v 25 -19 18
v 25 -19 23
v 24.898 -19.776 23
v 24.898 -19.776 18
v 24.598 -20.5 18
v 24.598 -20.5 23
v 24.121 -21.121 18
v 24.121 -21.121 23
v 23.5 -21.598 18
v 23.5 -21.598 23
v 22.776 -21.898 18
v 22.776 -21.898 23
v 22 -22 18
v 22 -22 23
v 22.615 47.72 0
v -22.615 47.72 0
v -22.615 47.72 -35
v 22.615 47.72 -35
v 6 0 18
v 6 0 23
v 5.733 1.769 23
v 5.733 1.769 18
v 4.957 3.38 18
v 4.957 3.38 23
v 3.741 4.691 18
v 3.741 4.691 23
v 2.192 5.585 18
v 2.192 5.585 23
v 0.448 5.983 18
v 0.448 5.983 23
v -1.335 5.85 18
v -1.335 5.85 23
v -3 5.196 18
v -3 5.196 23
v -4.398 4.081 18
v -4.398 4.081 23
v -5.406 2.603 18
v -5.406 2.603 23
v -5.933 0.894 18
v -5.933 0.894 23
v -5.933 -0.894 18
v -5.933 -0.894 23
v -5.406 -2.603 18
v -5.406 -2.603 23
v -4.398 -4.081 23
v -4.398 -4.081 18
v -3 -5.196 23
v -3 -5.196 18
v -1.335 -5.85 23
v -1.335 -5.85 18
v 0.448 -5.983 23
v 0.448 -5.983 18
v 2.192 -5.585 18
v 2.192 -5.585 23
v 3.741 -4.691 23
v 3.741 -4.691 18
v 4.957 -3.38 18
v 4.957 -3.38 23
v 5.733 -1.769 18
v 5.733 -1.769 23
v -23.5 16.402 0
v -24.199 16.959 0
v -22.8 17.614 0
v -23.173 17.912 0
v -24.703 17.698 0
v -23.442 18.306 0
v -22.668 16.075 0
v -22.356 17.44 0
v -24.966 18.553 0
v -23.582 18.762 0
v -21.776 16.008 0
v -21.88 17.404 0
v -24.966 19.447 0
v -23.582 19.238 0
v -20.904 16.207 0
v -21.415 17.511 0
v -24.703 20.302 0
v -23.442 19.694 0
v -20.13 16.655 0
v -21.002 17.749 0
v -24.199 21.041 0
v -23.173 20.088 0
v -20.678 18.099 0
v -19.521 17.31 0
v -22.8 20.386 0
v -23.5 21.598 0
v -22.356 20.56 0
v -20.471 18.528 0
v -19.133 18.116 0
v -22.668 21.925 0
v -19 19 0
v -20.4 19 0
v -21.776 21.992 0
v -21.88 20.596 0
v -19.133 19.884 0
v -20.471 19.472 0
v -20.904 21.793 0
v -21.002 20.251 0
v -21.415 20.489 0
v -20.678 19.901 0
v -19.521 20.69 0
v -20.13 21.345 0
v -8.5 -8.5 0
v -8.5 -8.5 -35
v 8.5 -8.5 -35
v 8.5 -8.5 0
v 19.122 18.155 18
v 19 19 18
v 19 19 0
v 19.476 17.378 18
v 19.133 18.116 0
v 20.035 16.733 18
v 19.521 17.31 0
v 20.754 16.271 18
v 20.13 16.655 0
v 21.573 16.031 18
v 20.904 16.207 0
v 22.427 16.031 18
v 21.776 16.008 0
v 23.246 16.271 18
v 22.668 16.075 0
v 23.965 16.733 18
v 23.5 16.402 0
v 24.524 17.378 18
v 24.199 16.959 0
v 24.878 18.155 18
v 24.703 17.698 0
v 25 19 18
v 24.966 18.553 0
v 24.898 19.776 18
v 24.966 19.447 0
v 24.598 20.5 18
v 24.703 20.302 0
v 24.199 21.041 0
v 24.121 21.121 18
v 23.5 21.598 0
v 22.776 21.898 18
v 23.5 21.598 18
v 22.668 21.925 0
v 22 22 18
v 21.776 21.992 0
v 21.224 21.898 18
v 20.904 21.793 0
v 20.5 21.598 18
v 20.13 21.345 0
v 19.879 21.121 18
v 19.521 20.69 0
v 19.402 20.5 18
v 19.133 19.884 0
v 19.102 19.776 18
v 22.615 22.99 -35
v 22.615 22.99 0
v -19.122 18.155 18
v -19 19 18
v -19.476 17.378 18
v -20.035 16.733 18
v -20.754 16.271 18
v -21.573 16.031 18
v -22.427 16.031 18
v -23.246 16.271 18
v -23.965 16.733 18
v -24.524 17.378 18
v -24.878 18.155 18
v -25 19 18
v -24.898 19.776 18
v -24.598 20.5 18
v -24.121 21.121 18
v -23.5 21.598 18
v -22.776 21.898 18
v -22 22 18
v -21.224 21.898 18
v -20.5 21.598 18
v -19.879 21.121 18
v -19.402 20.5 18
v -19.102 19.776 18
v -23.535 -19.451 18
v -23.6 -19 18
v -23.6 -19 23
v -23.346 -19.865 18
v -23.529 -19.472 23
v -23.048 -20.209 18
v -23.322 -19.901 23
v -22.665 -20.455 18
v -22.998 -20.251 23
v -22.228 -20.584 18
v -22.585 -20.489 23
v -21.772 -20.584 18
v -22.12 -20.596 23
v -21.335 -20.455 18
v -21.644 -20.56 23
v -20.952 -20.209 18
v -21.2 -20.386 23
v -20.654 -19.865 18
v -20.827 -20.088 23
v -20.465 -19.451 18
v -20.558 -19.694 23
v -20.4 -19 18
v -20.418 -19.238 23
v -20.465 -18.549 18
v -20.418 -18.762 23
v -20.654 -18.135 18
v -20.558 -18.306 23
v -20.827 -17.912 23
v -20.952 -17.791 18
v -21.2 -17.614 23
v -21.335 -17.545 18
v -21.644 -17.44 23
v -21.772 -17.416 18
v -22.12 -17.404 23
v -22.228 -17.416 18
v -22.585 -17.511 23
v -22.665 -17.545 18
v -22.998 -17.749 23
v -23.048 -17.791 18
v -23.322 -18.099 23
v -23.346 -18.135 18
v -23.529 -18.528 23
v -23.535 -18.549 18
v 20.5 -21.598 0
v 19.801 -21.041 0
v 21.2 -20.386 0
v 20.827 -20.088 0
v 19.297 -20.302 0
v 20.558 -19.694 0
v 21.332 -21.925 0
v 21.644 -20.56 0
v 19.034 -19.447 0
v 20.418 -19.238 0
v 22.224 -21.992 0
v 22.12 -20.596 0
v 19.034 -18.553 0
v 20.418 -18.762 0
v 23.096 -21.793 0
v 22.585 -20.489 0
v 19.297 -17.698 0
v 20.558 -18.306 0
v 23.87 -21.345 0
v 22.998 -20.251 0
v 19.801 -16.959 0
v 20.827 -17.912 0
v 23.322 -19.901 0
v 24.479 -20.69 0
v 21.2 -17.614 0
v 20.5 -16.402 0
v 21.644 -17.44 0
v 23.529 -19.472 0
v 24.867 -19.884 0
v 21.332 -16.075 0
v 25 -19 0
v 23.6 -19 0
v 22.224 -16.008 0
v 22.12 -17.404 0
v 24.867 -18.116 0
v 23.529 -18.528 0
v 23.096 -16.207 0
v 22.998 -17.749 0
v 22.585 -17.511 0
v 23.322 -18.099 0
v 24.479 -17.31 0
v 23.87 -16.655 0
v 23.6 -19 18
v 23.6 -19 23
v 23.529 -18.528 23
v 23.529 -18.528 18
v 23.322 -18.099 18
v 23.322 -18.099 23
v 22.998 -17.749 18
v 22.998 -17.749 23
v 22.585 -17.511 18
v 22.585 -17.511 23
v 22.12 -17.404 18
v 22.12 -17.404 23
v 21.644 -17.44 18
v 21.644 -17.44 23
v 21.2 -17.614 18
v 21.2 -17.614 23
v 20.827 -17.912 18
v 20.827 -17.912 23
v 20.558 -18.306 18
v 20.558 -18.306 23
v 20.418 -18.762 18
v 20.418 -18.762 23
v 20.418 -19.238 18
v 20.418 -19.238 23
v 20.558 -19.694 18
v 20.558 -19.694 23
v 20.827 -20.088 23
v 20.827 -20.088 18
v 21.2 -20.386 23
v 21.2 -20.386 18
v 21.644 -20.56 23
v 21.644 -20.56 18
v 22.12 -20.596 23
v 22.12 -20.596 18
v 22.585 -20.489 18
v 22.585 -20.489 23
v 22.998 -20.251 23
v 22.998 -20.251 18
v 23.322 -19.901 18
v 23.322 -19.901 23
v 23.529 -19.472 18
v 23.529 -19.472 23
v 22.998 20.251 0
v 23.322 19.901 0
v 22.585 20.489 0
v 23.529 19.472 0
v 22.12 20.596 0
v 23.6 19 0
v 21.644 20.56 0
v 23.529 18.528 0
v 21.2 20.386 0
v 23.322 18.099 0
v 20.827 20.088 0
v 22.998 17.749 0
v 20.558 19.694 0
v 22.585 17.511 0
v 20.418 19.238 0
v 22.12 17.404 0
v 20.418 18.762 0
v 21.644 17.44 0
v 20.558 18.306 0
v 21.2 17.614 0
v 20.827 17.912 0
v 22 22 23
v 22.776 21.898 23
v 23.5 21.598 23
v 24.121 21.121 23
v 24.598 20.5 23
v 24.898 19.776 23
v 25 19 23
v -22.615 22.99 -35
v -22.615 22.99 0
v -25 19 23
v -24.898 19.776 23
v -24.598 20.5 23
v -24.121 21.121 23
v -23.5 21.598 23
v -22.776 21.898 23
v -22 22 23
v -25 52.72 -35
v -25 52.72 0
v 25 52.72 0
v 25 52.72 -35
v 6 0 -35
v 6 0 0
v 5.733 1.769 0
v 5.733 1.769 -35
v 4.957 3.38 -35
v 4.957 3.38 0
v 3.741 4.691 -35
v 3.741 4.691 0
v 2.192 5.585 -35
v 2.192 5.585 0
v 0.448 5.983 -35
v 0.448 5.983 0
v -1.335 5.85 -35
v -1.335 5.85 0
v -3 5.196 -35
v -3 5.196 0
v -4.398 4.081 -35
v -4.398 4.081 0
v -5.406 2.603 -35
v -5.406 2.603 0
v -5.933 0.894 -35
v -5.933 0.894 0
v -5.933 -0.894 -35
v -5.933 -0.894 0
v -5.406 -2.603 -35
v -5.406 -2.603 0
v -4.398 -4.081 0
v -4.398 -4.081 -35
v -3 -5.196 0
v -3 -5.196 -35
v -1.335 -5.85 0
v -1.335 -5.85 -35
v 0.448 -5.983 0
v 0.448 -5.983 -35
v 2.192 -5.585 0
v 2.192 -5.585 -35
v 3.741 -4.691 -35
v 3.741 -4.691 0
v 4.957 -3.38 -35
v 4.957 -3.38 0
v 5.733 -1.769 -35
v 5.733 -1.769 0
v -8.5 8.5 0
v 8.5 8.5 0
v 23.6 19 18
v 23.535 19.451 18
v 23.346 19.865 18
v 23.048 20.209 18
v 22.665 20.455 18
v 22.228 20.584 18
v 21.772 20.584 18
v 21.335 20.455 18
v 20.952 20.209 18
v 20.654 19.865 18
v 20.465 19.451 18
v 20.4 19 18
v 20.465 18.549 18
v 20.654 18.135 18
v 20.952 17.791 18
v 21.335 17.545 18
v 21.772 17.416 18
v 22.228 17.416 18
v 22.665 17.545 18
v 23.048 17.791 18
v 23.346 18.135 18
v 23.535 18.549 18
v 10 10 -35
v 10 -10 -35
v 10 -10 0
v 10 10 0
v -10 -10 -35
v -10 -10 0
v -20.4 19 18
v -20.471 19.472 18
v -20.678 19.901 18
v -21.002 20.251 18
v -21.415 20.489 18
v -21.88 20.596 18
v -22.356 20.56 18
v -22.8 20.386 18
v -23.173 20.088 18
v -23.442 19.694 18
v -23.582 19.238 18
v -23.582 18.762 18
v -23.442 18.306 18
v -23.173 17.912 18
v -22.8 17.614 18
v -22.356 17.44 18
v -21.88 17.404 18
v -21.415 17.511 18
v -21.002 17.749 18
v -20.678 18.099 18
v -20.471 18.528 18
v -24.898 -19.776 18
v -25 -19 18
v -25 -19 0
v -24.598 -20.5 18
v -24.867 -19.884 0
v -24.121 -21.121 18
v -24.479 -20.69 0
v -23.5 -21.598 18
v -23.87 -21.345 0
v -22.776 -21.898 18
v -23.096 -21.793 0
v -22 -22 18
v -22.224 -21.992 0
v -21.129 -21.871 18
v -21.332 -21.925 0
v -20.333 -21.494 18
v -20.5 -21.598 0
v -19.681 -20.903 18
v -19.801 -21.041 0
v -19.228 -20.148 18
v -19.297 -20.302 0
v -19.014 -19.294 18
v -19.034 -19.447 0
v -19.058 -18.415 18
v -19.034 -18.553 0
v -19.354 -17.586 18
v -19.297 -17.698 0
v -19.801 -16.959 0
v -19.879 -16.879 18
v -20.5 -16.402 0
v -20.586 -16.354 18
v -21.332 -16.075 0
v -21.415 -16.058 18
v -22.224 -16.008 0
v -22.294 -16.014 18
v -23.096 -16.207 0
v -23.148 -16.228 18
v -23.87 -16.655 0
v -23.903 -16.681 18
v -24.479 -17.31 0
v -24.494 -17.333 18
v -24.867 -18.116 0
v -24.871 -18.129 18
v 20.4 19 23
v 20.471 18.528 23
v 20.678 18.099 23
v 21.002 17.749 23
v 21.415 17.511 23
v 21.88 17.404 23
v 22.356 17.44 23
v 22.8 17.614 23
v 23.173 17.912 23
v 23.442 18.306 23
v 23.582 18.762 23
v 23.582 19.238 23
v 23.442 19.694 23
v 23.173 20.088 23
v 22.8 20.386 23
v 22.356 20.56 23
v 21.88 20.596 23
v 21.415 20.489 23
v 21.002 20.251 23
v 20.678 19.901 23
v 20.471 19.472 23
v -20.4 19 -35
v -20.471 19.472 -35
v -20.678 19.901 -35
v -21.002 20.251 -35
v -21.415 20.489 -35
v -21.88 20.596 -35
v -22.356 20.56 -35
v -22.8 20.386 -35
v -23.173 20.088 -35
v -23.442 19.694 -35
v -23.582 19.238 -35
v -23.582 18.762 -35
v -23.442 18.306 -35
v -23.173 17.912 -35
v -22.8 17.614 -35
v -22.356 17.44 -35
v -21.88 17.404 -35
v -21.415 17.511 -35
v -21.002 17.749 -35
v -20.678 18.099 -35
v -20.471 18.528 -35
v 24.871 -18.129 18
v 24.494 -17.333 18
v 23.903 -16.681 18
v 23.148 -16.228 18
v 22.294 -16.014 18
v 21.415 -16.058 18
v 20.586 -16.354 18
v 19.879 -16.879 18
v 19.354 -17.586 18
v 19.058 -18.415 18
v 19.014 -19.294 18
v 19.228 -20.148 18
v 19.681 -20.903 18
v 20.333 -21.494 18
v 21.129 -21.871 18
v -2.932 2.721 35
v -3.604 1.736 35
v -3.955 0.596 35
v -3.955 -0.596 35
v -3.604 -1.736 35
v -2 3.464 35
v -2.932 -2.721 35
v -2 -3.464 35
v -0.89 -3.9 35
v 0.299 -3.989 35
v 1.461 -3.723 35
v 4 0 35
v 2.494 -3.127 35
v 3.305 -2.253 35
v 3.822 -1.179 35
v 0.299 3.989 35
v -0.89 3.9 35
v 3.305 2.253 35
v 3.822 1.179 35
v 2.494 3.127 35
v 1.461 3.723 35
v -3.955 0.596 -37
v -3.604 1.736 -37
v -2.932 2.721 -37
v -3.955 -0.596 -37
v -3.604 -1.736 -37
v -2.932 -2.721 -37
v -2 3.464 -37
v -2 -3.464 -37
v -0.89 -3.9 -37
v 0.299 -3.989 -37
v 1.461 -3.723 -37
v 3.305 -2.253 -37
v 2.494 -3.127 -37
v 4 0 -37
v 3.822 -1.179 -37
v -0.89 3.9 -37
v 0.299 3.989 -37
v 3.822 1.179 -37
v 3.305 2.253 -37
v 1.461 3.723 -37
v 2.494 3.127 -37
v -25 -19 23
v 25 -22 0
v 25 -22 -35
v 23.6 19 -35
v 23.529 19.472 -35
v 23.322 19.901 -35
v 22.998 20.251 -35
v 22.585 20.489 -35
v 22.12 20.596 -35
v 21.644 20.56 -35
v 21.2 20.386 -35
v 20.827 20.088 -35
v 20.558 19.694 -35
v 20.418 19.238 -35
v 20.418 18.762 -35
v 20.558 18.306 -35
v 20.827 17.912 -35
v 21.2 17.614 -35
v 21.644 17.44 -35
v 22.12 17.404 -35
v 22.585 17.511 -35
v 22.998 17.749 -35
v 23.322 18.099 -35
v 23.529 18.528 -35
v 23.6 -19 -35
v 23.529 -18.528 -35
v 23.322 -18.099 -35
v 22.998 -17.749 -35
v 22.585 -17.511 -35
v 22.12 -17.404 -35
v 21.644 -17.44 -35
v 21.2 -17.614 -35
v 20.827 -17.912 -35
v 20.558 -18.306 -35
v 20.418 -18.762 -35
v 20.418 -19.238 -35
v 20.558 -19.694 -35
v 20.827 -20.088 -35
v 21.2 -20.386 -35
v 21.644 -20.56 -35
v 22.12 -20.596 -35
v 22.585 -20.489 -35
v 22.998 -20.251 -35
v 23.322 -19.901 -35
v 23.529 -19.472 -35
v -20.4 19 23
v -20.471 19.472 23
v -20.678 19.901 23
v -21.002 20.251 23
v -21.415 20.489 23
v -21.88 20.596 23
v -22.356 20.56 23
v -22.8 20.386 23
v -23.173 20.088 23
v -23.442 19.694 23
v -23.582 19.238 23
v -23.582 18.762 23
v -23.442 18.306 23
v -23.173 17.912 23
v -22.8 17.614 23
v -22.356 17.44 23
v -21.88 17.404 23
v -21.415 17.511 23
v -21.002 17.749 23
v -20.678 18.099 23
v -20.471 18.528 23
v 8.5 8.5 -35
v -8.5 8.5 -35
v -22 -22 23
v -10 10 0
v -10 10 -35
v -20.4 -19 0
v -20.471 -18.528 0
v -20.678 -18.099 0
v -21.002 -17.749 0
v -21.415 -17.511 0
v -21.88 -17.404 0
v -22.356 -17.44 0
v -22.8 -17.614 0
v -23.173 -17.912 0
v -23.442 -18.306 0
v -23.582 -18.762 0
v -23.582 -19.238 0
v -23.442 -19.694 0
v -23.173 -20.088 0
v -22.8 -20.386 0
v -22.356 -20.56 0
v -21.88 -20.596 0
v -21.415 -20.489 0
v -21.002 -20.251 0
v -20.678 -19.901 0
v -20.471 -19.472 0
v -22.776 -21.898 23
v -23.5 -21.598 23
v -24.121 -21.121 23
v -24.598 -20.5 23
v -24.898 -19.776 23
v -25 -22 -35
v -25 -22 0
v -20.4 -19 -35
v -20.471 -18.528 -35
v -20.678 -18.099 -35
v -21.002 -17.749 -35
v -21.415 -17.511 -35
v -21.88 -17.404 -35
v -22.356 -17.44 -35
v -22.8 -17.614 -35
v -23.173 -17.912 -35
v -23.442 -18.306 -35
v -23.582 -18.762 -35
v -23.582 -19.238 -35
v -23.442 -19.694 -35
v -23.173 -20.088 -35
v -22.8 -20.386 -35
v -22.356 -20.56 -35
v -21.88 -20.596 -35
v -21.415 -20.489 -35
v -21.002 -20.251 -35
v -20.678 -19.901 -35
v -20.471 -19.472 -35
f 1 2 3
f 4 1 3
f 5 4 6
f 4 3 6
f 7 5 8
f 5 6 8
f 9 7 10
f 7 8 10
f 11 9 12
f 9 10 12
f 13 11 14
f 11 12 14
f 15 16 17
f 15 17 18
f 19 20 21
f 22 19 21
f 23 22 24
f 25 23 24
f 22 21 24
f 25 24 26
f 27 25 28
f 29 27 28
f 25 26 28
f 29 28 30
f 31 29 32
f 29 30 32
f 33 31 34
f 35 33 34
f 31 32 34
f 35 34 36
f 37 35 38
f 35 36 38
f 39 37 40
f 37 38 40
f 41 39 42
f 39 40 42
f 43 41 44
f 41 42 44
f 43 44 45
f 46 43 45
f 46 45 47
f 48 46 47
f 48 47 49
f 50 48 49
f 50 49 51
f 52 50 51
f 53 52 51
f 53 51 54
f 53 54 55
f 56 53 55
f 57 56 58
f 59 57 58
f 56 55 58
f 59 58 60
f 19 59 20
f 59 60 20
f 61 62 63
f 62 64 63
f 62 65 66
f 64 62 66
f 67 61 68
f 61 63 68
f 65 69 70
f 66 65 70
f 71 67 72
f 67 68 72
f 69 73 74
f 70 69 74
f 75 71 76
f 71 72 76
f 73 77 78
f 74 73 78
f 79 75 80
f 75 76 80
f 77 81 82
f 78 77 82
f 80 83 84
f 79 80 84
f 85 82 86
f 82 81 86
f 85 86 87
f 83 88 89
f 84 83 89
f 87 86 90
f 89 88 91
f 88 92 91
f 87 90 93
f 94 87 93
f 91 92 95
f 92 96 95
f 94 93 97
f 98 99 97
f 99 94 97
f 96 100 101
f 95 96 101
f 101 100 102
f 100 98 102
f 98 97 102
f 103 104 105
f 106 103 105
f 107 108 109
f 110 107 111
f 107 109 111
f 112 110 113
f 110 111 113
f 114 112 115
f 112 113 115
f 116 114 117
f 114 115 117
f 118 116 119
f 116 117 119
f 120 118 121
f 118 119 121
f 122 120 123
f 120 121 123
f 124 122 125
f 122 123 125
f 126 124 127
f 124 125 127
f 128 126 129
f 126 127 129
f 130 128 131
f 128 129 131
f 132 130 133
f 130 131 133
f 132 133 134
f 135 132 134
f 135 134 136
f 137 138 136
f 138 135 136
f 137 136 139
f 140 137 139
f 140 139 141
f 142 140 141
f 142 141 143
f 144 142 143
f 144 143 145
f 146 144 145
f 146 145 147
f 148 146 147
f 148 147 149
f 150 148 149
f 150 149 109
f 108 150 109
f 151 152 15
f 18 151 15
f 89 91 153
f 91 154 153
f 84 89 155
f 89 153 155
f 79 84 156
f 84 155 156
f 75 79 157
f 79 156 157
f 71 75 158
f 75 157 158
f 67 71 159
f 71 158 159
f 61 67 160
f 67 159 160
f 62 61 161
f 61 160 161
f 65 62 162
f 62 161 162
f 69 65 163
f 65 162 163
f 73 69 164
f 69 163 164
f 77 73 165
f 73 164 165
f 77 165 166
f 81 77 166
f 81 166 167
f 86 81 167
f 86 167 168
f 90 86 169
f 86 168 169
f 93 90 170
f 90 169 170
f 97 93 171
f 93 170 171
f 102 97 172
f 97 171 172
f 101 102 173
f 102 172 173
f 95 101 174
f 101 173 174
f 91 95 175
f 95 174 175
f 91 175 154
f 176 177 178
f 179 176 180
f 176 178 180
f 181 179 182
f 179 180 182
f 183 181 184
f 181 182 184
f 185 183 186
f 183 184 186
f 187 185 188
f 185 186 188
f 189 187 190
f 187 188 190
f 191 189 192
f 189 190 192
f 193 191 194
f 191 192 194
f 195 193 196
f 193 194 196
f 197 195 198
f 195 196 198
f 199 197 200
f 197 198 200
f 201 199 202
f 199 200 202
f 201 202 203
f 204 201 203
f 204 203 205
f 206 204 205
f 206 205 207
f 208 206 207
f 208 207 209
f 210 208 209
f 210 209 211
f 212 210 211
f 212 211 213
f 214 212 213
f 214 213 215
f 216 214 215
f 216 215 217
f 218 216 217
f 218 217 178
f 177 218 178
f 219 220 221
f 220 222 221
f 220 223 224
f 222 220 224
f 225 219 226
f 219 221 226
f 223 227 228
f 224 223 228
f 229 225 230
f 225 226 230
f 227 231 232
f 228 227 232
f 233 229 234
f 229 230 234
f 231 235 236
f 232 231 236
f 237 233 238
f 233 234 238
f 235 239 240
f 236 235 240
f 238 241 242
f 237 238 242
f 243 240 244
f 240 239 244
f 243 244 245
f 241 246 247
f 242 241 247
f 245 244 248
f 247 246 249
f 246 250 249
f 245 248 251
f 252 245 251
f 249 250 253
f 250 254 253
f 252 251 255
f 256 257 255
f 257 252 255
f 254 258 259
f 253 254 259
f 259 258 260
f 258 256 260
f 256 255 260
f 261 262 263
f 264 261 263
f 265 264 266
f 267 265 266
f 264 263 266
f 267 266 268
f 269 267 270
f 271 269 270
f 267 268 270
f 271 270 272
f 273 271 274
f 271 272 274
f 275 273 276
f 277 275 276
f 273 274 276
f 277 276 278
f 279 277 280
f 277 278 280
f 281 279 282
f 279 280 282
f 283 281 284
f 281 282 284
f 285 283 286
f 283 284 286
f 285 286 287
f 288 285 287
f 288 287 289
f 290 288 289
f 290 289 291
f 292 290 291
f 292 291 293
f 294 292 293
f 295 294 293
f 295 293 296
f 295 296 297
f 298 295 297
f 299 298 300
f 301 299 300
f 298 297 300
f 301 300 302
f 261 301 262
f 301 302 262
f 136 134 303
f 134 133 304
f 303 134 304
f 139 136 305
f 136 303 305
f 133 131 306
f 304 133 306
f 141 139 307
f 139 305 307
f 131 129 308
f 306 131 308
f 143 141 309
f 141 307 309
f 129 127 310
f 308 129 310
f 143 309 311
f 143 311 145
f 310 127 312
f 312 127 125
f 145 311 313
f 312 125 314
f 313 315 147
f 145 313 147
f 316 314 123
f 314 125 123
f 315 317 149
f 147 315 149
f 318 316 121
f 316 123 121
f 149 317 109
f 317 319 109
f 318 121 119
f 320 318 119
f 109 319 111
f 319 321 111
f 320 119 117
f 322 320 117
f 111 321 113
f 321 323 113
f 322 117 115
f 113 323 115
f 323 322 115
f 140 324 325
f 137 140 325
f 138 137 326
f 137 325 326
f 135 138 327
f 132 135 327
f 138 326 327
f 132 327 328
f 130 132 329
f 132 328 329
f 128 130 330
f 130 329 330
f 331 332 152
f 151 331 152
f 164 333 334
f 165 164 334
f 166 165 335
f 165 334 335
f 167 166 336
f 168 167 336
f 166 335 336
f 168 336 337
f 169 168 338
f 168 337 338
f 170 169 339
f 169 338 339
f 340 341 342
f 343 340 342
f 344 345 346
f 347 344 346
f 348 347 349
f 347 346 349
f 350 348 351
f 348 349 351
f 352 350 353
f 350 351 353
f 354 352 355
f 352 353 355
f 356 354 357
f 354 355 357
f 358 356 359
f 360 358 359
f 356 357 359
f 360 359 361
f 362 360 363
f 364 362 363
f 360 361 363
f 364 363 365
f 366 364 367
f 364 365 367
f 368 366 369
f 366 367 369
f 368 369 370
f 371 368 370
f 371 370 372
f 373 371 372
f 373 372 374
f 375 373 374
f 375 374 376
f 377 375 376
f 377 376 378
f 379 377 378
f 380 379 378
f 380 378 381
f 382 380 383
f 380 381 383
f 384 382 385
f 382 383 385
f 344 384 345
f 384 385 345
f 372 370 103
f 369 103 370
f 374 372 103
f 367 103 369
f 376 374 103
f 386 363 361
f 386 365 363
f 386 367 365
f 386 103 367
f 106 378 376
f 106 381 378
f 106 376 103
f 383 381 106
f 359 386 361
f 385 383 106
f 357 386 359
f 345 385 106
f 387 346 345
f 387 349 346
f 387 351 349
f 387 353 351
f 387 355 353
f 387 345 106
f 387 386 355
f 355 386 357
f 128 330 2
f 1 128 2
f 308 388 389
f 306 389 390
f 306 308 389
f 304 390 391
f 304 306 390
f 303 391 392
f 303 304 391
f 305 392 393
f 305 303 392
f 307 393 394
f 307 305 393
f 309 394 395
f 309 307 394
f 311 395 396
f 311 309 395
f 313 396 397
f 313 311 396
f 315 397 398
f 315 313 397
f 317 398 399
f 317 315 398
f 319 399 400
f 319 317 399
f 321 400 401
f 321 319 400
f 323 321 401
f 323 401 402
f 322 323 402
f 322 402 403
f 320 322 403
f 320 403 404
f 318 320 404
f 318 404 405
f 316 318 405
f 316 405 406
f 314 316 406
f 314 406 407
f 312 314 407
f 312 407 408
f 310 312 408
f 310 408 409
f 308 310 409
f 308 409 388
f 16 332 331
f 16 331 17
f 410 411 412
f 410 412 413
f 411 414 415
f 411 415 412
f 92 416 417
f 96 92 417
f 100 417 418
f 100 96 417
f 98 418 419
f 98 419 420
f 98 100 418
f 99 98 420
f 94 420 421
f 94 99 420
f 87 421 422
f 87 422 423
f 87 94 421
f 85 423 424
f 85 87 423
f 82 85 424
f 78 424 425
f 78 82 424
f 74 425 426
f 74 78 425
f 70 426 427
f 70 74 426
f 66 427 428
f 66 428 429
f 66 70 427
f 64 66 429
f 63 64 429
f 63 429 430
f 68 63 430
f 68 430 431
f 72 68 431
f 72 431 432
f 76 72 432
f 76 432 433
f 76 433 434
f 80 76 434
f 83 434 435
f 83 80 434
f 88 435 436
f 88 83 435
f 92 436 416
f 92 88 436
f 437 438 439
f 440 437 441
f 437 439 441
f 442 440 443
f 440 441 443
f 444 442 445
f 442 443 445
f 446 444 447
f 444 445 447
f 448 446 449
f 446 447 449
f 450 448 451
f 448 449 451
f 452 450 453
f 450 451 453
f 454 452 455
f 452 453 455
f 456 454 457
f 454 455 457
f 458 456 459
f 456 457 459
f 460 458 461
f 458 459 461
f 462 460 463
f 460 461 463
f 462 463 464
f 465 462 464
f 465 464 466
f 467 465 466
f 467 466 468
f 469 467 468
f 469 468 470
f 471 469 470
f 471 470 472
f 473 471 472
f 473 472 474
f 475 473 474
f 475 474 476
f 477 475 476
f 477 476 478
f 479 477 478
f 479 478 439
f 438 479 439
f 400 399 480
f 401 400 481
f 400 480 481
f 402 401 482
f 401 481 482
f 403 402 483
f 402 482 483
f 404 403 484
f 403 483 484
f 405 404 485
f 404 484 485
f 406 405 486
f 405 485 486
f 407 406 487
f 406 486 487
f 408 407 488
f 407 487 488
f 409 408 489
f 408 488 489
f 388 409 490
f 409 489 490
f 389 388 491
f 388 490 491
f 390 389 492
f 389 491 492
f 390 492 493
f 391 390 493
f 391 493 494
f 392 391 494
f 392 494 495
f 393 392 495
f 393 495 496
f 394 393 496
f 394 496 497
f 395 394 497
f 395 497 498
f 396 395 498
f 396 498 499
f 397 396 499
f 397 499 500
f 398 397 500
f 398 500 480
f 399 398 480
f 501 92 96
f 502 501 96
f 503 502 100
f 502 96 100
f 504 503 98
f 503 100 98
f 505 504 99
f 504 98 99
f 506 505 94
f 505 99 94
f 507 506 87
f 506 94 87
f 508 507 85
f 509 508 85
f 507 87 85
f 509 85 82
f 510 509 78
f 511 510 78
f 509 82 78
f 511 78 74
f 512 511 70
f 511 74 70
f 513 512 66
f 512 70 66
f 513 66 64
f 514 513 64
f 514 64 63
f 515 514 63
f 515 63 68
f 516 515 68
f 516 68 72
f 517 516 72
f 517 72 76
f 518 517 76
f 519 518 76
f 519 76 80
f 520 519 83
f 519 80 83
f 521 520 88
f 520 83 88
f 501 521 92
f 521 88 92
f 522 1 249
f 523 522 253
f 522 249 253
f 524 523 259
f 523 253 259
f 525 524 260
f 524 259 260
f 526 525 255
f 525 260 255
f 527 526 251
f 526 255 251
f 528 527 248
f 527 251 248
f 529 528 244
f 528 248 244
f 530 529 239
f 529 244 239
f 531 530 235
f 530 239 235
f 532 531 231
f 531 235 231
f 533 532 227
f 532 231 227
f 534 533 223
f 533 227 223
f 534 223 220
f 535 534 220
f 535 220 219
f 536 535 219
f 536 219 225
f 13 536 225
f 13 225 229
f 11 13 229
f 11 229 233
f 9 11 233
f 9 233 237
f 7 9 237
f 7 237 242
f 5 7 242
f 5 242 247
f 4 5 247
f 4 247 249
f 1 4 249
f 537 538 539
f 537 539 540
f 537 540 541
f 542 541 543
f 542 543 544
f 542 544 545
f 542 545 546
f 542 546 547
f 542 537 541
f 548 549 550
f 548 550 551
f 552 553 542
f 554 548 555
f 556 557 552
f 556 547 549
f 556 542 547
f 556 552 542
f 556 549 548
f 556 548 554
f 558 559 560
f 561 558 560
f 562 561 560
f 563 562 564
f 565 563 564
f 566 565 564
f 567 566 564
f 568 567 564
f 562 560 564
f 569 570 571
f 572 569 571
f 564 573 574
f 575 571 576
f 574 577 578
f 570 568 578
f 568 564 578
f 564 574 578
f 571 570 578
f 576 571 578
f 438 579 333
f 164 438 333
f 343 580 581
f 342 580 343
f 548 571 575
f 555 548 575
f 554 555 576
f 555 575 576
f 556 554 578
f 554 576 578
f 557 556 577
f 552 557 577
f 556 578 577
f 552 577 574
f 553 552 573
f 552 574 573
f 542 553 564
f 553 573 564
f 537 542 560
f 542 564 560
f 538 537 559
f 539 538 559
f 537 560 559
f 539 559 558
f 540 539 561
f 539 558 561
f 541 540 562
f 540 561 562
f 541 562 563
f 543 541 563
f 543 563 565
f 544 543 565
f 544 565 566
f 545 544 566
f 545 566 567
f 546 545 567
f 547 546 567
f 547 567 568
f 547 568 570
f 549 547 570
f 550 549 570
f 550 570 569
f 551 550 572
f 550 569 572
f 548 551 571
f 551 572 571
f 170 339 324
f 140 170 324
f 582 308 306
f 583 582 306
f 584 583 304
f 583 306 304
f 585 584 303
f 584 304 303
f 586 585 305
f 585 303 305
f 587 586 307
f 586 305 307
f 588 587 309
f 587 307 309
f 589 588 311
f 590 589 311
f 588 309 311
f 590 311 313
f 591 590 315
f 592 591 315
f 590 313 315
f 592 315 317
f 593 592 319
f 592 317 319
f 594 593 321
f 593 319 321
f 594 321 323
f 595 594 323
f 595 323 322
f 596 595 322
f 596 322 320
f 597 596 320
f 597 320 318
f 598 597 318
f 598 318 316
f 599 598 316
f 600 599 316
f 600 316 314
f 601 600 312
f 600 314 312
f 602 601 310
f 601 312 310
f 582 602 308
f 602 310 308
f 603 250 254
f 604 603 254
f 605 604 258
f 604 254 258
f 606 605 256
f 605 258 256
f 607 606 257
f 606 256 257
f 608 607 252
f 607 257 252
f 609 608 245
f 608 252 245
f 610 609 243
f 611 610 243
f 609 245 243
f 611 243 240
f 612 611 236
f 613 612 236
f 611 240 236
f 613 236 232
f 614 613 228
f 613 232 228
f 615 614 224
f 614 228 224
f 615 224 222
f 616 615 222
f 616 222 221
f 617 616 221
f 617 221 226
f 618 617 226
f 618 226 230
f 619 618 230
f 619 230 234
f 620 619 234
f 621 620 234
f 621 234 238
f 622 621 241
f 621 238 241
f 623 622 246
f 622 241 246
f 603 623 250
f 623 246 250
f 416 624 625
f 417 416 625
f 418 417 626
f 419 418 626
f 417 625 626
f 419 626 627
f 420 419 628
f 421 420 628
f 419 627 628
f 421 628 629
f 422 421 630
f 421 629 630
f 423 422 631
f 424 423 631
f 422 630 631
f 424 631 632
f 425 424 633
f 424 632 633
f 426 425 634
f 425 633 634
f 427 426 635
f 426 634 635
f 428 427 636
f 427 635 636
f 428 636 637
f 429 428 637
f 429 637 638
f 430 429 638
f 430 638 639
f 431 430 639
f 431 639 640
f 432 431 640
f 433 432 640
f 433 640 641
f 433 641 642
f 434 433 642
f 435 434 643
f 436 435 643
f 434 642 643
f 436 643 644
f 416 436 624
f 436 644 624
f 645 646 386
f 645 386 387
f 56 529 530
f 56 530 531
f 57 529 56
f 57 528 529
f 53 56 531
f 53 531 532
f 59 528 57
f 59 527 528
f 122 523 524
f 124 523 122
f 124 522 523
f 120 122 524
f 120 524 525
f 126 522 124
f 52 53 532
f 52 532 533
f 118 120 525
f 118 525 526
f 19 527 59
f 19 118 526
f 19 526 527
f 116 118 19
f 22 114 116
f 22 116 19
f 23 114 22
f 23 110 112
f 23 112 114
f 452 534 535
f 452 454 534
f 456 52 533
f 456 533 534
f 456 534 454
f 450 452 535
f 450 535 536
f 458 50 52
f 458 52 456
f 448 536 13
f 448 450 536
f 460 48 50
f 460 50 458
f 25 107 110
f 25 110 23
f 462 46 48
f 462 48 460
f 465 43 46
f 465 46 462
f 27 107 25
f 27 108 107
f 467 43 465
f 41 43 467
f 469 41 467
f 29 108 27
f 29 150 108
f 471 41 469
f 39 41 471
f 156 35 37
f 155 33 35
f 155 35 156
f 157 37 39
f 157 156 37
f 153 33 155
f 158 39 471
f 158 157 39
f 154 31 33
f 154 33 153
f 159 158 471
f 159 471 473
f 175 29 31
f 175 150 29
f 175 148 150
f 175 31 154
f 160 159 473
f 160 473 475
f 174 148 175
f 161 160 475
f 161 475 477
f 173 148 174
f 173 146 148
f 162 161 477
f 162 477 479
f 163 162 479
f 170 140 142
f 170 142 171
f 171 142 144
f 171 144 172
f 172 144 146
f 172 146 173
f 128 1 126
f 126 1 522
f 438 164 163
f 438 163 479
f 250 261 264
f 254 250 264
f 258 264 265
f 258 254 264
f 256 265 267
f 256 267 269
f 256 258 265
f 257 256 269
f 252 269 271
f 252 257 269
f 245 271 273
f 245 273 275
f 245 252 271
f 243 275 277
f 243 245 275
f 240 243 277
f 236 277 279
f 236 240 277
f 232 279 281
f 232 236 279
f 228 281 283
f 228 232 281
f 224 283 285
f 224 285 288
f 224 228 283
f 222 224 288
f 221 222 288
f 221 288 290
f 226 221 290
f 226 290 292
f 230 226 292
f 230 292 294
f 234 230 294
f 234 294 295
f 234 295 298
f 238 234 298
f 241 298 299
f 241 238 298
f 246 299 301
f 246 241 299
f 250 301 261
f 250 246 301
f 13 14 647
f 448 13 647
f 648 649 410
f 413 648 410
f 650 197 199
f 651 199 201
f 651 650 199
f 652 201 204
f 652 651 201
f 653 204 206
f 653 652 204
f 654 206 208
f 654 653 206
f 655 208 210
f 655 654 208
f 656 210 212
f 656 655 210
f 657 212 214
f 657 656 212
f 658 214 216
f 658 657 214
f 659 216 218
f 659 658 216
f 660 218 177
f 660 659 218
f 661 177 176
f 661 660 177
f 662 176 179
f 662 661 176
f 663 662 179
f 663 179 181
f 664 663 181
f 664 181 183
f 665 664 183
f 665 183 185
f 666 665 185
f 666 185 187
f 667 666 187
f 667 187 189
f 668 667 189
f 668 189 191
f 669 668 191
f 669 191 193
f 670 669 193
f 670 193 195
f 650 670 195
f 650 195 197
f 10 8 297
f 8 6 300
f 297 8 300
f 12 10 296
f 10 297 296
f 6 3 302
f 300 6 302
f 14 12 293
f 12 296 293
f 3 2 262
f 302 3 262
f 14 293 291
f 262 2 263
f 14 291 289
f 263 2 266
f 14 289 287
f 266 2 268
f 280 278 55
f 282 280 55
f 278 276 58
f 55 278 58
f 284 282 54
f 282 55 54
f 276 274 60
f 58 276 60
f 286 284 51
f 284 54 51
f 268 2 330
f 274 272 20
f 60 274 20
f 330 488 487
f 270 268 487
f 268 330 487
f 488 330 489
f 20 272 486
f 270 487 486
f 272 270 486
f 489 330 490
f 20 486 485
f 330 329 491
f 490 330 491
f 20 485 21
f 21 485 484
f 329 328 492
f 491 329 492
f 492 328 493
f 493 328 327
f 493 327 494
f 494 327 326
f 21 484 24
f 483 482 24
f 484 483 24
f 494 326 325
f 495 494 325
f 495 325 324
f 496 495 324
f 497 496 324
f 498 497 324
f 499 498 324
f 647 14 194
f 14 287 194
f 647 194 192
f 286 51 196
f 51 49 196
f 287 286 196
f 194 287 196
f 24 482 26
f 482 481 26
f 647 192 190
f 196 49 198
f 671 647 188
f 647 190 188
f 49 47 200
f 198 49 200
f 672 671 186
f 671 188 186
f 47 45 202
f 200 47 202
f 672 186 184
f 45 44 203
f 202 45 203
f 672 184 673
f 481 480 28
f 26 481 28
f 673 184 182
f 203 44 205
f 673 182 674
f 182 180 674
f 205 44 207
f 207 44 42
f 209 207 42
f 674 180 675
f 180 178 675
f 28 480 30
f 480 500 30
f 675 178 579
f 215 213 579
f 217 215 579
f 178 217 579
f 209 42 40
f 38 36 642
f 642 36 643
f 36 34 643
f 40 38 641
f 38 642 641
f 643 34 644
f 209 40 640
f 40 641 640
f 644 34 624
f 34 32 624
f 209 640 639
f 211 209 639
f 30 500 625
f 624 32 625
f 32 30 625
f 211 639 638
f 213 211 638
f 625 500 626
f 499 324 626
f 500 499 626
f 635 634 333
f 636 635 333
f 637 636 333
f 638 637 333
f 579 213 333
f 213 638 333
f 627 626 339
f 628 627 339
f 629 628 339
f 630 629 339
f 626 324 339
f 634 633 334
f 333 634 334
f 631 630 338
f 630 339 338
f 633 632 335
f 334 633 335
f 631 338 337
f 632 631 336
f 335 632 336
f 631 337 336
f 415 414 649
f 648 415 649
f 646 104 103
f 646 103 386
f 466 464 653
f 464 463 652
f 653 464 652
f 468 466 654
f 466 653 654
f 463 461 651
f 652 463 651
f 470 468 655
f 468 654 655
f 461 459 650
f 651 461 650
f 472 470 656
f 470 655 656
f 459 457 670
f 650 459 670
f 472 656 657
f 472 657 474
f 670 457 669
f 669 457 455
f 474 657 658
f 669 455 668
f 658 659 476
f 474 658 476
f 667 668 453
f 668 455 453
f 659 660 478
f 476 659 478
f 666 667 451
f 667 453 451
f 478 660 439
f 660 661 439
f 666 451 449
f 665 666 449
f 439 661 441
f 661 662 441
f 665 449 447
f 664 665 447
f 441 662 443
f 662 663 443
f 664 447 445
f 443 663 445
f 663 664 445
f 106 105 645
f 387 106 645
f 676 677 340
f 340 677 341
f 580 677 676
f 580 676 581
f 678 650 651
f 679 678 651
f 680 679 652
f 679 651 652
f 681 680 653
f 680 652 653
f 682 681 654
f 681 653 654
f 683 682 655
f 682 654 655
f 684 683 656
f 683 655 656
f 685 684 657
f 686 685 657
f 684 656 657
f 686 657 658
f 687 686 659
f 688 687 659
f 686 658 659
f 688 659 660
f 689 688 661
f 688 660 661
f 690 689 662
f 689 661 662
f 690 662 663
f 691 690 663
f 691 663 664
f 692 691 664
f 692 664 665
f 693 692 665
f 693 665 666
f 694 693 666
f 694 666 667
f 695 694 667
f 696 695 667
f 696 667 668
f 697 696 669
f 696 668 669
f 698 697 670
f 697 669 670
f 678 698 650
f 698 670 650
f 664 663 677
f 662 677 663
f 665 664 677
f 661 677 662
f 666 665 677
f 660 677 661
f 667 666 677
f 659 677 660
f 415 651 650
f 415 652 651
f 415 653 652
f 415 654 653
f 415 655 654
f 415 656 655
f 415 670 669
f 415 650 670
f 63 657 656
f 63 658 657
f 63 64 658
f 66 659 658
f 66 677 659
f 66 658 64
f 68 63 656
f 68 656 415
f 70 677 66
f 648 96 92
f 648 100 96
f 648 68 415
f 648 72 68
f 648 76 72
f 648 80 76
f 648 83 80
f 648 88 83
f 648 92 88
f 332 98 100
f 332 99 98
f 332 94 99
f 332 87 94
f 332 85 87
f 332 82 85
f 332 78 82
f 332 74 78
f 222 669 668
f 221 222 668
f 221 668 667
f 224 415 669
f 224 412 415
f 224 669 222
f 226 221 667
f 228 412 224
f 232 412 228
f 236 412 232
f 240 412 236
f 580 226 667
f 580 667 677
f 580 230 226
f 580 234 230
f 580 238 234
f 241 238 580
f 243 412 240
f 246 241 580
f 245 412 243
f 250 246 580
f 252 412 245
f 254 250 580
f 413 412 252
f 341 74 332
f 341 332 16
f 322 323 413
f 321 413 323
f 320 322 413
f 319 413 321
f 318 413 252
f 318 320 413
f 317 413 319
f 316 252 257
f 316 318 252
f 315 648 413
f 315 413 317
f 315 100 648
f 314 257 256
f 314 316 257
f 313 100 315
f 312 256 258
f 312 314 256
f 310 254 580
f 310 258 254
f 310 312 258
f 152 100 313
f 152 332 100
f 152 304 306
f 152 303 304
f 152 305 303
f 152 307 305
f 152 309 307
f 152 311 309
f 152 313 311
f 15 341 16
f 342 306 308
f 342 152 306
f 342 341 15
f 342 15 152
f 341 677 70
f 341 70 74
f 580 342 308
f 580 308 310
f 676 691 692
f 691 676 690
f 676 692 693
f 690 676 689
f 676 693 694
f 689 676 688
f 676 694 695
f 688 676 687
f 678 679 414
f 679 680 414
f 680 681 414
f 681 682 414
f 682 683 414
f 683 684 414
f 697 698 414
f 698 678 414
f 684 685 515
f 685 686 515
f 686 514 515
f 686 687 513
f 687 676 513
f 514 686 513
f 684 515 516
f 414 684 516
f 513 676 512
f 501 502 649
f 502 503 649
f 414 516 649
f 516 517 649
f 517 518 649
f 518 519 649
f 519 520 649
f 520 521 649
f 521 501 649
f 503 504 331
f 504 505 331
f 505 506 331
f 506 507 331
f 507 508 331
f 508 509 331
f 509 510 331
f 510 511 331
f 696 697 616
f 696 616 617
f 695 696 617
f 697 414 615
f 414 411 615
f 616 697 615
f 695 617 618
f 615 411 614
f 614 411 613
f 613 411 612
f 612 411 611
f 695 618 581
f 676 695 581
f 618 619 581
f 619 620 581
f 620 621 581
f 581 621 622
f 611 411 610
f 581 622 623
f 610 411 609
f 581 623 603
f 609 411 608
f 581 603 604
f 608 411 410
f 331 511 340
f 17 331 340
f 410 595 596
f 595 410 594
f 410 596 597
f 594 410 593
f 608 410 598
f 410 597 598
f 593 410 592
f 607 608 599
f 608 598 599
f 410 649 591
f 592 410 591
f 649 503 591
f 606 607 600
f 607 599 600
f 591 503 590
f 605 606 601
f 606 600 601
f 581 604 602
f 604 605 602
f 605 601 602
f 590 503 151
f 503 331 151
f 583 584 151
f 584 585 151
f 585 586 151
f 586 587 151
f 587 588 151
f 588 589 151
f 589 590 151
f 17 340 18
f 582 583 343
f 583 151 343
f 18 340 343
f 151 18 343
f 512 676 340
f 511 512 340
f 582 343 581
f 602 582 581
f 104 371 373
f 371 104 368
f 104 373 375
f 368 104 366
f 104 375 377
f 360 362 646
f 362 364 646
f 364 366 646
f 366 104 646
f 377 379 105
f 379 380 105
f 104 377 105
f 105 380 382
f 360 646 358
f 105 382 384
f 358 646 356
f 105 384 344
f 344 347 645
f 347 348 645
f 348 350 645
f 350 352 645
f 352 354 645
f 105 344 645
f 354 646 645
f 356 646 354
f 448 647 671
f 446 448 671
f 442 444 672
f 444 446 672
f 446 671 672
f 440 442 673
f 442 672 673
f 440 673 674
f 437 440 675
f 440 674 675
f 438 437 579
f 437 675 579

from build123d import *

# Parameters (mm, degrees)
SKETCH_2_W           = 50
SKETCH_2_H           = 74.720339059
SKETCH_2_R           = 1.6
SKETCH_2_W_2         = 20
SKETCH_2_H_2         = 20
SKETCH_2_W_3         = 45.23
SKETCH_2_H_3         = 24.73
EXTRUDE_1_DEPTH      = 35
SKETCH_2_W_4         = 17
SKETCH_2_H_4         = 17
SKETCH_2_R_2         = 6
EXTRUDE_1_2_DEPTH    = 35
EXTRUDE_2_DEPTH      = 35
EXTRUDE_2_DEPTH_BACK = 37
SKETCH_3_R           = 4
SKETCH_6_R           = 3
SKETCH_6_R_2         = 1.6
EXTRUDE_3_DEPTH      = 18
EXTRUDE_3_2_DEPTH    = 18
EXTRUDE_3_3_DEPTH    = 18
EXTRUDE_3_4_DEPTH    = 18
EXTRUDE_START        = 5
SKETCH_7_R           = 1.6
SKETCH_7_R_2         = 6
EXTRUDE_4_DEPTH      = 5


with BuildPart() as part:
    # ｽｹｯﾁ2 → ﾎﾞｽ - 押し出し1 (new body)
    with BuildSketch(Plane.XY):
        with Locations((0, 15.36016953)):
            Rectangle(SKETCH_2_W, SKETCH_2_H)
        with Locations((-22, 19)):
            Circle(SKETCH_2_R, mode=Mode.SUBTRACT)
        with Locations((-22, -19)):
            Circle(SKETCH_2_R, mode=Mode.SUBTRACT)
        with Locations((22, -19)):
            Circle(SKETCH_2_R, mode=Mode.SUBTRACT)
        with Locations((22, 19)):
            Circle(SKETCH_2_R, mode=Mode.SUBTRACT)
        Rectangle(SKETCH_2_W_2, SKETCH_2_H_2, mode=Mode.SUBTRACT)
        with Locations((0, 35.355339059)):
            Rectangle(SKETCH_2_W_3, SKETCH_2_H_3, mode=Mode.SUBTRACT)
    extrude(amount=-EXTRUDE_1_DEPTH)


with BuildPart() as body_2:
    # ｽｹｯﾁ2 → Extrude 1 2 (new body)
    with BuildSketch(Plane.XY):
        Rectangle(SKETCH_2_W_4, SKETCH_2_H_4)
        Circle(SKETCH_2_R_2, mode=Mode.SUBTRACT)
    extrude(amount=-EXTRUDE_1_2_DEPTH)


with BuildPart() as body_3:
    # ｽｹｯﾁ3 → ﾎﾞｽ - 押し出し2 (new, two sides: drawn at the far end of the back side and taken through both)
    with BuildSketch(Plane.XY.offset(-EXTRUDE_2_DEPTH_BACK)):
        Circle(SKETCH_3_R)
    extrude(amount=EXTRUDE_2_DEPTH + EXTRUDE_2_DEPTH_BACK)


with BuildPart() as body_4:
    # ｽｹｯﾁ6 → ﾎﾞｽ - 押し出し3 (new body)
    with BuildSketch(Plane.XY):
        with Locations((-22, 19)):
            Circle(SKETCH_6_R)
        with Locations((-22, 19)):
            Circle(SKETCH_6_R_2, mode=Mode.SUBTRACT)
    extrude(amount=EXTRUDE_3_DEPTH)



with BuildPart() as body_5:
    # ｽｹｯﾁ6 → Extrude 3 2 (new body)
    with BuildSketch(Plane.XY):
        with Locations(Location((-22, -19, 0), (0, 0, 180))):
            Circle(SKETCH_6_R)
        with Locations((-22, -19)):
            Circle(SKETCH_6_R_2, mode=Mode.SUBTRACT)
    extrude(amount=EXTRUDE_3_2_DEPTH)


with BuildPart() as body_6:
    # ｽｹｯﾁ6 → Extrude 3 3 (new body)
    with BuildSketch(Plane.XY):
        with Locations((22, -19)):
            Circle(SKETCH_6_R)
        with Locations((22, -19)):
            Circle(SKETCH_6_R_2, mode=Mode.SUBTRACT)
    extrude(amount=EXTRUDE_3_3_DEPTH)


with BuildPart() as body_7:
    # ｽｹｯﾁ6 → Extrude 3 4 (new body)
    with BuildSketch(Plane.XY):
        with Locations(Location((22, 19, 0), (0, 0, 180))):
            Circle(SKETCH_6_R)
        with Locations((22, 19)):
            Circle(SKETCH_6_R_2, mode=Mode.SUBTRACT)
    extrude(amount=EXTRUDE_3_4_DEPTH)


with BuildPart() as body_4_1:
    add(body_4.part)

    add(body_5.part)  # ﾎﾞｽ - 押し出し4 merges body 5

    add(body_6.part)  # ﾎﾞｽ - 押し出し4 merges body 6

    add(body_7.part)  # ﾎﾞｽ - 押し出し4 merges body 7
    # ｽｹｯﾁ7 → ﾎﾞｽ - 押し出し4 (add)
    with BuildSketch(Plane.XY.offset(18).offset(EXTRUDE_START)):
        with BuildLine():
            Line((-22, 22), (22, 22))
            ThreePointArc((22, 22), (24.121320344, 21.121320344), (25, 19))
            Line((25, 19), (25, -19))
            ThreePointArc((25, -19), (24.121320344, -21.121320344), (22, -22))
            Line((22, -22), (-22, -22))
            ThreePointArc((-22, -22), (-24.121320344, -21.121320344), (-25, -19))
            Line((-25, -19), (-25, 19))
            ThreePointArc((-25, 19), (-24.121320344, 21.121320344), (-22, 22))
        make_face()
        with Locations(Location((-22, -19, 0), (0, 0, 180))):
            Circle(SKETCH_7_R, mode=Mode.SUBTRACT)
        with Locations((22, -19)):
            Circle(SKETCH_7_R, mode=Mode.SUBTRACT)
        with Locations(Location((22, 19, 0), (0, 0, 180))):
            Circle(SKETCH_7_R, mode=Mode.SUBTRACT)
        with Locations((-22, 19)):
            Circle(SKETCH_7_R, mode=Mode.SUBTRACT)
        Circle(SKETCH_7_R_2, mode=Mode.SUBTRACT)
    extrude(amount=-EXTRUDE_4_DEPTH)


solid = Compound([part.part, body_2.part, body_3.part, body_4_1.part])
